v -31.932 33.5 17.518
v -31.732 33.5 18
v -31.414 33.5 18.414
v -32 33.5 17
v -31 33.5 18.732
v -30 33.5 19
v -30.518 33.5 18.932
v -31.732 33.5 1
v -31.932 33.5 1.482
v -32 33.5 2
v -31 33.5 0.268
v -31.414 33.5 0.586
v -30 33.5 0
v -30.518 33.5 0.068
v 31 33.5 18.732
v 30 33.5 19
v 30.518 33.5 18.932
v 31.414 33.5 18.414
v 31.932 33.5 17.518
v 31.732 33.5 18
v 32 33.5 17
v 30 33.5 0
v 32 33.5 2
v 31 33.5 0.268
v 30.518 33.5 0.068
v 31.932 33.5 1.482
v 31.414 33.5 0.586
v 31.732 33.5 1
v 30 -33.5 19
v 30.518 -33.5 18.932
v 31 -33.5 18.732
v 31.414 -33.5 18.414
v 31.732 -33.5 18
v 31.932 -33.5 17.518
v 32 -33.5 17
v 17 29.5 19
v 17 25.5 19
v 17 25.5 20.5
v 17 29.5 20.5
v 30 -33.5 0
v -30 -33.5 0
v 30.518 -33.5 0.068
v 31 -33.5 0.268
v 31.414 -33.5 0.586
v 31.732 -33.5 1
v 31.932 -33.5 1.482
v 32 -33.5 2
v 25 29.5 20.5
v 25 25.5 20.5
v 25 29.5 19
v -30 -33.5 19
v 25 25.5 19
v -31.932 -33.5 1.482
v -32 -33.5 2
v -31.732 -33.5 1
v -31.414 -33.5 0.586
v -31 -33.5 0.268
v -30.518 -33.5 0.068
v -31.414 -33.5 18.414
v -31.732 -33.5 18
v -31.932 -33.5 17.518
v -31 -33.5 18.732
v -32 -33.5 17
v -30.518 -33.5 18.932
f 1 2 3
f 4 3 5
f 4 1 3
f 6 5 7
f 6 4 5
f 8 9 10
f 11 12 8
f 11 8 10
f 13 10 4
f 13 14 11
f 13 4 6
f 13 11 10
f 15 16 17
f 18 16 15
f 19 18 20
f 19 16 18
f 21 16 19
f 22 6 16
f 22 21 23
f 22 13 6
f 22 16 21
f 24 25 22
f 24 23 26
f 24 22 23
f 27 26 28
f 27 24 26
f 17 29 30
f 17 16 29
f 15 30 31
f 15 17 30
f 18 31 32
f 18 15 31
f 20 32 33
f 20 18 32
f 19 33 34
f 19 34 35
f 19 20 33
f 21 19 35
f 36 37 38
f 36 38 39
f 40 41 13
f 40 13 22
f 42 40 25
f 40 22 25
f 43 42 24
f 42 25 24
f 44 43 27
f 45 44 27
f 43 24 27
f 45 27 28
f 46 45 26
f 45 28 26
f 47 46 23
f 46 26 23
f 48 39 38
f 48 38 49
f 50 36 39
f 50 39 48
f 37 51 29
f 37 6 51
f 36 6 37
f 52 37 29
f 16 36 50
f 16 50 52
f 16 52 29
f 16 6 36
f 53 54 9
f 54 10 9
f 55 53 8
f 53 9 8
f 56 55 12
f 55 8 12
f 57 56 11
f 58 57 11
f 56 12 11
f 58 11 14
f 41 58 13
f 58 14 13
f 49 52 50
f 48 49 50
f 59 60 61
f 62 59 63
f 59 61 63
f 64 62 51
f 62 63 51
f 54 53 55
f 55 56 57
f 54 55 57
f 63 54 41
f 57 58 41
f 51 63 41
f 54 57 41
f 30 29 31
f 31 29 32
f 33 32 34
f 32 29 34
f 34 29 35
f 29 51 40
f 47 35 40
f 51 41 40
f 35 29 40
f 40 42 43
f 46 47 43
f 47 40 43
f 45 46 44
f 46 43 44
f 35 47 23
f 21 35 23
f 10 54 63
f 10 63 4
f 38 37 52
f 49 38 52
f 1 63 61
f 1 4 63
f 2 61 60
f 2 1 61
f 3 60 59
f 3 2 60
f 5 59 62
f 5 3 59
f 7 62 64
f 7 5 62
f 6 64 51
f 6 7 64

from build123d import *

# Parameters (mm, degrees)
SKETCH1_W           = 64
SKETCH1_H           = 67
BOSS_EXTRUDE1_DEPTH = 19
SKETCH2_W           = 8
SKETCH2_H           = 4
BOSS_EXTRUDE2_DEPTH = 1.5
FILLET1_R           = 2


with BuildPart() as part:
    # Sketch1 → Boss-Extrude1 (new body)
    with BuildSketch(Plane.XY):
        Rectangle(SKETCH1_W, SKETCH1_H)
    extrude(amount=BOSS_EXTRUDE1_DEPTH)

    # Sketch2 → Boss-Extrude2 (add)
    with BuildSketch(Plane.XY.offset(19)):
        with Locations((21, 27.5)):
            Rectangle(SKETCH2_W, SKETCH2_H)
    extrude(amount=BOSS_EXTRUDE2_DEPTH)

    # Fillet1
    fillet1_edges = [part.edges().sort_by_distance(p)[0] for p in [
        (32, 0, 19),
        (-32, 0, 19),
        (32, 0, 0),
        (-32, 0, 0),
    ]]
    fillet(fillet1_edges, radius=FILLET1_R)


solid = part.part
